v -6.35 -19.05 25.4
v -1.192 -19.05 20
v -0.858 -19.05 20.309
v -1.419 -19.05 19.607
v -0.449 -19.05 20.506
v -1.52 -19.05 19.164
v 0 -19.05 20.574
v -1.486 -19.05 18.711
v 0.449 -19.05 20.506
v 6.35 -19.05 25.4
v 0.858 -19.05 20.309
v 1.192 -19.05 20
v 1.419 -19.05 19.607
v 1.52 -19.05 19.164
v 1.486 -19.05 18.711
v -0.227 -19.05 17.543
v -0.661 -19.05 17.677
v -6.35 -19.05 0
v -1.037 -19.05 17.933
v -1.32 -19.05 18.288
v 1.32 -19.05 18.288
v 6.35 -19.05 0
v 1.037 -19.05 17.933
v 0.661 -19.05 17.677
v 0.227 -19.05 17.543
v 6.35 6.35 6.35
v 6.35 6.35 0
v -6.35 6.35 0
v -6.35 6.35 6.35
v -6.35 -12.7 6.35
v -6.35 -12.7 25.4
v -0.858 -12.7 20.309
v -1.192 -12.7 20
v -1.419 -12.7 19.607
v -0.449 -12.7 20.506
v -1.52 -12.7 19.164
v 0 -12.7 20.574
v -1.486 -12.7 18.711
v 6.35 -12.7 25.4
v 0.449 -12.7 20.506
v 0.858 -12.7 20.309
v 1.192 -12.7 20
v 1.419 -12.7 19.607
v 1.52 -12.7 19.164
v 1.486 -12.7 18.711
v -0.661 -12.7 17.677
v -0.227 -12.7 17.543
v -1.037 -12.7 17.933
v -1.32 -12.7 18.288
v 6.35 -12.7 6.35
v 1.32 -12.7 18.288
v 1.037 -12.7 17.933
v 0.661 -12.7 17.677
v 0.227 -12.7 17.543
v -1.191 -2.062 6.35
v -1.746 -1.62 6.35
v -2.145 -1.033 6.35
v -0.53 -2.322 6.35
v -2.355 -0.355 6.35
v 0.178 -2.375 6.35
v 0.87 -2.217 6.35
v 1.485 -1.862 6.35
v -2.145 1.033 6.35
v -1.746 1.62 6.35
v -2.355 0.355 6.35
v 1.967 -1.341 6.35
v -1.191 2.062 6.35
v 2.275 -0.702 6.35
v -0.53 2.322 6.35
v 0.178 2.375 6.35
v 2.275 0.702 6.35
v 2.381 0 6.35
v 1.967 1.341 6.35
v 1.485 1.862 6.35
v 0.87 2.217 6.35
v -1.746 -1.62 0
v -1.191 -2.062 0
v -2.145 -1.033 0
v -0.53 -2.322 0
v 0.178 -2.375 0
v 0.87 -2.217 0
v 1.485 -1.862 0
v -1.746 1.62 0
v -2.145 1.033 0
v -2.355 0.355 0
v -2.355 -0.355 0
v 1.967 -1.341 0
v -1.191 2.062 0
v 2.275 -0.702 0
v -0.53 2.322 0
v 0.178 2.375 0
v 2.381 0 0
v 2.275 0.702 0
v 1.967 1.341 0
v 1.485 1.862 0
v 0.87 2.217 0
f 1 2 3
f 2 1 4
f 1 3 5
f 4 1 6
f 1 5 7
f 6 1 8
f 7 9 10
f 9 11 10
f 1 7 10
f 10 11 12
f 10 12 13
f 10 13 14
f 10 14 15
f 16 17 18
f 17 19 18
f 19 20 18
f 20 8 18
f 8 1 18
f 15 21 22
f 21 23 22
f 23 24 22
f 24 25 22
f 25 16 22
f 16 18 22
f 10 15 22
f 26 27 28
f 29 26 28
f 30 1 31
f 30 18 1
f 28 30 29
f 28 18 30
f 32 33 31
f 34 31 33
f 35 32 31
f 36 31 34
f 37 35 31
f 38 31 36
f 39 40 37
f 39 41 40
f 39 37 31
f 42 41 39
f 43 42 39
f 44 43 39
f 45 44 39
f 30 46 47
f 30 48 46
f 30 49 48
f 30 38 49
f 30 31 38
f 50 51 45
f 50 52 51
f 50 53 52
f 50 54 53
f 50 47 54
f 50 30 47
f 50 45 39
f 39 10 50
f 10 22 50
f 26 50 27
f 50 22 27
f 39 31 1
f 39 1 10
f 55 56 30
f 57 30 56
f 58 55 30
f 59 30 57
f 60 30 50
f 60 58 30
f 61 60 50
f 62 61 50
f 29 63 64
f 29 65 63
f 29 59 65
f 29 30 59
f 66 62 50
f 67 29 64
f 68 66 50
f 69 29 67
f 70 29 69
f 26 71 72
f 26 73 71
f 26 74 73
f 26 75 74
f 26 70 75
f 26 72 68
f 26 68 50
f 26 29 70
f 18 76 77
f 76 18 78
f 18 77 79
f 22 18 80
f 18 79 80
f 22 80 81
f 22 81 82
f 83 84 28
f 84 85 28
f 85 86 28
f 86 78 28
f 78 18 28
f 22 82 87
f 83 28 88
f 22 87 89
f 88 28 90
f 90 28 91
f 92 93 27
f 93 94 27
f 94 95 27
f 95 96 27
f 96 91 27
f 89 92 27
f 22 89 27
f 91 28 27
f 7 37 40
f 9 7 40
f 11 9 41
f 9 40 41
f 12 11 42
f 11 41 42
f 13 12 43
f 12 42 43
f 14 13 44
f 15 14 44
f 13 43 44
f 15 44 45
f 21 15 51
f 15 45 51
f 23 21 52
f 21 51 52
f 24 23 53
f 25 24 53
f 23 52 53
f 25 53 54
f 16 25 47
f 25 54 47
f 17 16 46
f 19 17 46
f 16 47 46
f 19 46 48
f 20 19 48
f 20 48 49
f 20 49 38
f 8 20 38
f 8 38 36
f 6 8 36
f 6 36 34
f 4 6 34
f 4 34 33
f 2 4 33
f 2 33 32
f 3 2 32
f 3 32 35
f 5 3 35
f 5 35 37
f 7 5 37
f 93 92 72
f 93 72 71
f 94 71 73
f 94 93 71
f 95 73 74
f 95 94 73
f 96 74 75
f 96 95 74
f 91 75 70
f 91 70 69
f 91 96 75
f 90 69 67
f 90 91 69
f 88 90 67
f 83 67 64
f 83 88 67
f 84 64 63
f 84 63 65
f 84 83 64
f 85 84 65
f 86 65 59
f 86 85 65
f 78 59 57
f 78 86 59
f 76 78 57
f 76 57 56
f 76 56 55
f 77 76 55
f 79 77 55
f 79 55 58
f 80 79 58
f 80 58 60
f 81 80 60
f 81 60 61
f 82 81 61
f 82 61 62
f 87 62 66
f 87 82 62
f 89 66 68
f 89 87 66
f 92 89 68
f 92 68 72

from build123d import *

# Parameters (mm, degrees)
SKETCH1_R           = 2.38125
BOSS_EXTRUDE1_DEPTH = 6.35
SKETCH2_W           = 12.7
SKETCH2_H           = 6.35
BOSS_EXTRUDE2_DEPTH = 19.05
SKETCH3_R           = 1.524
CUT_EXTRUDE1_DEPTH  = 19.05


with BuildPart() as part:
    # Sketch1 → Boss-Extrude1 (new body)
    with BuildSketch(Plane.XY):
        Polygon((-6.35, 0), (-6.35, -19.05), (6.35, -19.05), (6.35, 0), (6.35, 6.35), (-6.35, 6.35), align=None)
        Circle(SKETCH1_R, mode=Mode.SUBTRACT)
    extrude(amount=BOSS_EXTRUDE1_DEPTH)

    # Sketch2 → Boss-Extrude2 (add)
    with BuildSketch(Plane.XY.offset(6.35)):
        with Locations((0, -15.875)):
            Rectangle(SKETCH2_W, SKETCH2_H)
    extrude(amount=BOSS_EXTRUDE2_DEPTH)

    # Sketch3 → Cut-Extrude1 (cut)
    with BuildSketch(Plane(origin=(0, -12.7, 0), x_dir=(1, 0, 0), z_dir=(0, 1, 0))):
        with Locations(Location((0, -19.05, 0), (0, 0, 270))):
            Circle(SKETCH3_R)
    extrude(amount=-CUT_EXTRUDE1_DEPTH, mode=Mode.SUBTRACT)


solid = part.part
